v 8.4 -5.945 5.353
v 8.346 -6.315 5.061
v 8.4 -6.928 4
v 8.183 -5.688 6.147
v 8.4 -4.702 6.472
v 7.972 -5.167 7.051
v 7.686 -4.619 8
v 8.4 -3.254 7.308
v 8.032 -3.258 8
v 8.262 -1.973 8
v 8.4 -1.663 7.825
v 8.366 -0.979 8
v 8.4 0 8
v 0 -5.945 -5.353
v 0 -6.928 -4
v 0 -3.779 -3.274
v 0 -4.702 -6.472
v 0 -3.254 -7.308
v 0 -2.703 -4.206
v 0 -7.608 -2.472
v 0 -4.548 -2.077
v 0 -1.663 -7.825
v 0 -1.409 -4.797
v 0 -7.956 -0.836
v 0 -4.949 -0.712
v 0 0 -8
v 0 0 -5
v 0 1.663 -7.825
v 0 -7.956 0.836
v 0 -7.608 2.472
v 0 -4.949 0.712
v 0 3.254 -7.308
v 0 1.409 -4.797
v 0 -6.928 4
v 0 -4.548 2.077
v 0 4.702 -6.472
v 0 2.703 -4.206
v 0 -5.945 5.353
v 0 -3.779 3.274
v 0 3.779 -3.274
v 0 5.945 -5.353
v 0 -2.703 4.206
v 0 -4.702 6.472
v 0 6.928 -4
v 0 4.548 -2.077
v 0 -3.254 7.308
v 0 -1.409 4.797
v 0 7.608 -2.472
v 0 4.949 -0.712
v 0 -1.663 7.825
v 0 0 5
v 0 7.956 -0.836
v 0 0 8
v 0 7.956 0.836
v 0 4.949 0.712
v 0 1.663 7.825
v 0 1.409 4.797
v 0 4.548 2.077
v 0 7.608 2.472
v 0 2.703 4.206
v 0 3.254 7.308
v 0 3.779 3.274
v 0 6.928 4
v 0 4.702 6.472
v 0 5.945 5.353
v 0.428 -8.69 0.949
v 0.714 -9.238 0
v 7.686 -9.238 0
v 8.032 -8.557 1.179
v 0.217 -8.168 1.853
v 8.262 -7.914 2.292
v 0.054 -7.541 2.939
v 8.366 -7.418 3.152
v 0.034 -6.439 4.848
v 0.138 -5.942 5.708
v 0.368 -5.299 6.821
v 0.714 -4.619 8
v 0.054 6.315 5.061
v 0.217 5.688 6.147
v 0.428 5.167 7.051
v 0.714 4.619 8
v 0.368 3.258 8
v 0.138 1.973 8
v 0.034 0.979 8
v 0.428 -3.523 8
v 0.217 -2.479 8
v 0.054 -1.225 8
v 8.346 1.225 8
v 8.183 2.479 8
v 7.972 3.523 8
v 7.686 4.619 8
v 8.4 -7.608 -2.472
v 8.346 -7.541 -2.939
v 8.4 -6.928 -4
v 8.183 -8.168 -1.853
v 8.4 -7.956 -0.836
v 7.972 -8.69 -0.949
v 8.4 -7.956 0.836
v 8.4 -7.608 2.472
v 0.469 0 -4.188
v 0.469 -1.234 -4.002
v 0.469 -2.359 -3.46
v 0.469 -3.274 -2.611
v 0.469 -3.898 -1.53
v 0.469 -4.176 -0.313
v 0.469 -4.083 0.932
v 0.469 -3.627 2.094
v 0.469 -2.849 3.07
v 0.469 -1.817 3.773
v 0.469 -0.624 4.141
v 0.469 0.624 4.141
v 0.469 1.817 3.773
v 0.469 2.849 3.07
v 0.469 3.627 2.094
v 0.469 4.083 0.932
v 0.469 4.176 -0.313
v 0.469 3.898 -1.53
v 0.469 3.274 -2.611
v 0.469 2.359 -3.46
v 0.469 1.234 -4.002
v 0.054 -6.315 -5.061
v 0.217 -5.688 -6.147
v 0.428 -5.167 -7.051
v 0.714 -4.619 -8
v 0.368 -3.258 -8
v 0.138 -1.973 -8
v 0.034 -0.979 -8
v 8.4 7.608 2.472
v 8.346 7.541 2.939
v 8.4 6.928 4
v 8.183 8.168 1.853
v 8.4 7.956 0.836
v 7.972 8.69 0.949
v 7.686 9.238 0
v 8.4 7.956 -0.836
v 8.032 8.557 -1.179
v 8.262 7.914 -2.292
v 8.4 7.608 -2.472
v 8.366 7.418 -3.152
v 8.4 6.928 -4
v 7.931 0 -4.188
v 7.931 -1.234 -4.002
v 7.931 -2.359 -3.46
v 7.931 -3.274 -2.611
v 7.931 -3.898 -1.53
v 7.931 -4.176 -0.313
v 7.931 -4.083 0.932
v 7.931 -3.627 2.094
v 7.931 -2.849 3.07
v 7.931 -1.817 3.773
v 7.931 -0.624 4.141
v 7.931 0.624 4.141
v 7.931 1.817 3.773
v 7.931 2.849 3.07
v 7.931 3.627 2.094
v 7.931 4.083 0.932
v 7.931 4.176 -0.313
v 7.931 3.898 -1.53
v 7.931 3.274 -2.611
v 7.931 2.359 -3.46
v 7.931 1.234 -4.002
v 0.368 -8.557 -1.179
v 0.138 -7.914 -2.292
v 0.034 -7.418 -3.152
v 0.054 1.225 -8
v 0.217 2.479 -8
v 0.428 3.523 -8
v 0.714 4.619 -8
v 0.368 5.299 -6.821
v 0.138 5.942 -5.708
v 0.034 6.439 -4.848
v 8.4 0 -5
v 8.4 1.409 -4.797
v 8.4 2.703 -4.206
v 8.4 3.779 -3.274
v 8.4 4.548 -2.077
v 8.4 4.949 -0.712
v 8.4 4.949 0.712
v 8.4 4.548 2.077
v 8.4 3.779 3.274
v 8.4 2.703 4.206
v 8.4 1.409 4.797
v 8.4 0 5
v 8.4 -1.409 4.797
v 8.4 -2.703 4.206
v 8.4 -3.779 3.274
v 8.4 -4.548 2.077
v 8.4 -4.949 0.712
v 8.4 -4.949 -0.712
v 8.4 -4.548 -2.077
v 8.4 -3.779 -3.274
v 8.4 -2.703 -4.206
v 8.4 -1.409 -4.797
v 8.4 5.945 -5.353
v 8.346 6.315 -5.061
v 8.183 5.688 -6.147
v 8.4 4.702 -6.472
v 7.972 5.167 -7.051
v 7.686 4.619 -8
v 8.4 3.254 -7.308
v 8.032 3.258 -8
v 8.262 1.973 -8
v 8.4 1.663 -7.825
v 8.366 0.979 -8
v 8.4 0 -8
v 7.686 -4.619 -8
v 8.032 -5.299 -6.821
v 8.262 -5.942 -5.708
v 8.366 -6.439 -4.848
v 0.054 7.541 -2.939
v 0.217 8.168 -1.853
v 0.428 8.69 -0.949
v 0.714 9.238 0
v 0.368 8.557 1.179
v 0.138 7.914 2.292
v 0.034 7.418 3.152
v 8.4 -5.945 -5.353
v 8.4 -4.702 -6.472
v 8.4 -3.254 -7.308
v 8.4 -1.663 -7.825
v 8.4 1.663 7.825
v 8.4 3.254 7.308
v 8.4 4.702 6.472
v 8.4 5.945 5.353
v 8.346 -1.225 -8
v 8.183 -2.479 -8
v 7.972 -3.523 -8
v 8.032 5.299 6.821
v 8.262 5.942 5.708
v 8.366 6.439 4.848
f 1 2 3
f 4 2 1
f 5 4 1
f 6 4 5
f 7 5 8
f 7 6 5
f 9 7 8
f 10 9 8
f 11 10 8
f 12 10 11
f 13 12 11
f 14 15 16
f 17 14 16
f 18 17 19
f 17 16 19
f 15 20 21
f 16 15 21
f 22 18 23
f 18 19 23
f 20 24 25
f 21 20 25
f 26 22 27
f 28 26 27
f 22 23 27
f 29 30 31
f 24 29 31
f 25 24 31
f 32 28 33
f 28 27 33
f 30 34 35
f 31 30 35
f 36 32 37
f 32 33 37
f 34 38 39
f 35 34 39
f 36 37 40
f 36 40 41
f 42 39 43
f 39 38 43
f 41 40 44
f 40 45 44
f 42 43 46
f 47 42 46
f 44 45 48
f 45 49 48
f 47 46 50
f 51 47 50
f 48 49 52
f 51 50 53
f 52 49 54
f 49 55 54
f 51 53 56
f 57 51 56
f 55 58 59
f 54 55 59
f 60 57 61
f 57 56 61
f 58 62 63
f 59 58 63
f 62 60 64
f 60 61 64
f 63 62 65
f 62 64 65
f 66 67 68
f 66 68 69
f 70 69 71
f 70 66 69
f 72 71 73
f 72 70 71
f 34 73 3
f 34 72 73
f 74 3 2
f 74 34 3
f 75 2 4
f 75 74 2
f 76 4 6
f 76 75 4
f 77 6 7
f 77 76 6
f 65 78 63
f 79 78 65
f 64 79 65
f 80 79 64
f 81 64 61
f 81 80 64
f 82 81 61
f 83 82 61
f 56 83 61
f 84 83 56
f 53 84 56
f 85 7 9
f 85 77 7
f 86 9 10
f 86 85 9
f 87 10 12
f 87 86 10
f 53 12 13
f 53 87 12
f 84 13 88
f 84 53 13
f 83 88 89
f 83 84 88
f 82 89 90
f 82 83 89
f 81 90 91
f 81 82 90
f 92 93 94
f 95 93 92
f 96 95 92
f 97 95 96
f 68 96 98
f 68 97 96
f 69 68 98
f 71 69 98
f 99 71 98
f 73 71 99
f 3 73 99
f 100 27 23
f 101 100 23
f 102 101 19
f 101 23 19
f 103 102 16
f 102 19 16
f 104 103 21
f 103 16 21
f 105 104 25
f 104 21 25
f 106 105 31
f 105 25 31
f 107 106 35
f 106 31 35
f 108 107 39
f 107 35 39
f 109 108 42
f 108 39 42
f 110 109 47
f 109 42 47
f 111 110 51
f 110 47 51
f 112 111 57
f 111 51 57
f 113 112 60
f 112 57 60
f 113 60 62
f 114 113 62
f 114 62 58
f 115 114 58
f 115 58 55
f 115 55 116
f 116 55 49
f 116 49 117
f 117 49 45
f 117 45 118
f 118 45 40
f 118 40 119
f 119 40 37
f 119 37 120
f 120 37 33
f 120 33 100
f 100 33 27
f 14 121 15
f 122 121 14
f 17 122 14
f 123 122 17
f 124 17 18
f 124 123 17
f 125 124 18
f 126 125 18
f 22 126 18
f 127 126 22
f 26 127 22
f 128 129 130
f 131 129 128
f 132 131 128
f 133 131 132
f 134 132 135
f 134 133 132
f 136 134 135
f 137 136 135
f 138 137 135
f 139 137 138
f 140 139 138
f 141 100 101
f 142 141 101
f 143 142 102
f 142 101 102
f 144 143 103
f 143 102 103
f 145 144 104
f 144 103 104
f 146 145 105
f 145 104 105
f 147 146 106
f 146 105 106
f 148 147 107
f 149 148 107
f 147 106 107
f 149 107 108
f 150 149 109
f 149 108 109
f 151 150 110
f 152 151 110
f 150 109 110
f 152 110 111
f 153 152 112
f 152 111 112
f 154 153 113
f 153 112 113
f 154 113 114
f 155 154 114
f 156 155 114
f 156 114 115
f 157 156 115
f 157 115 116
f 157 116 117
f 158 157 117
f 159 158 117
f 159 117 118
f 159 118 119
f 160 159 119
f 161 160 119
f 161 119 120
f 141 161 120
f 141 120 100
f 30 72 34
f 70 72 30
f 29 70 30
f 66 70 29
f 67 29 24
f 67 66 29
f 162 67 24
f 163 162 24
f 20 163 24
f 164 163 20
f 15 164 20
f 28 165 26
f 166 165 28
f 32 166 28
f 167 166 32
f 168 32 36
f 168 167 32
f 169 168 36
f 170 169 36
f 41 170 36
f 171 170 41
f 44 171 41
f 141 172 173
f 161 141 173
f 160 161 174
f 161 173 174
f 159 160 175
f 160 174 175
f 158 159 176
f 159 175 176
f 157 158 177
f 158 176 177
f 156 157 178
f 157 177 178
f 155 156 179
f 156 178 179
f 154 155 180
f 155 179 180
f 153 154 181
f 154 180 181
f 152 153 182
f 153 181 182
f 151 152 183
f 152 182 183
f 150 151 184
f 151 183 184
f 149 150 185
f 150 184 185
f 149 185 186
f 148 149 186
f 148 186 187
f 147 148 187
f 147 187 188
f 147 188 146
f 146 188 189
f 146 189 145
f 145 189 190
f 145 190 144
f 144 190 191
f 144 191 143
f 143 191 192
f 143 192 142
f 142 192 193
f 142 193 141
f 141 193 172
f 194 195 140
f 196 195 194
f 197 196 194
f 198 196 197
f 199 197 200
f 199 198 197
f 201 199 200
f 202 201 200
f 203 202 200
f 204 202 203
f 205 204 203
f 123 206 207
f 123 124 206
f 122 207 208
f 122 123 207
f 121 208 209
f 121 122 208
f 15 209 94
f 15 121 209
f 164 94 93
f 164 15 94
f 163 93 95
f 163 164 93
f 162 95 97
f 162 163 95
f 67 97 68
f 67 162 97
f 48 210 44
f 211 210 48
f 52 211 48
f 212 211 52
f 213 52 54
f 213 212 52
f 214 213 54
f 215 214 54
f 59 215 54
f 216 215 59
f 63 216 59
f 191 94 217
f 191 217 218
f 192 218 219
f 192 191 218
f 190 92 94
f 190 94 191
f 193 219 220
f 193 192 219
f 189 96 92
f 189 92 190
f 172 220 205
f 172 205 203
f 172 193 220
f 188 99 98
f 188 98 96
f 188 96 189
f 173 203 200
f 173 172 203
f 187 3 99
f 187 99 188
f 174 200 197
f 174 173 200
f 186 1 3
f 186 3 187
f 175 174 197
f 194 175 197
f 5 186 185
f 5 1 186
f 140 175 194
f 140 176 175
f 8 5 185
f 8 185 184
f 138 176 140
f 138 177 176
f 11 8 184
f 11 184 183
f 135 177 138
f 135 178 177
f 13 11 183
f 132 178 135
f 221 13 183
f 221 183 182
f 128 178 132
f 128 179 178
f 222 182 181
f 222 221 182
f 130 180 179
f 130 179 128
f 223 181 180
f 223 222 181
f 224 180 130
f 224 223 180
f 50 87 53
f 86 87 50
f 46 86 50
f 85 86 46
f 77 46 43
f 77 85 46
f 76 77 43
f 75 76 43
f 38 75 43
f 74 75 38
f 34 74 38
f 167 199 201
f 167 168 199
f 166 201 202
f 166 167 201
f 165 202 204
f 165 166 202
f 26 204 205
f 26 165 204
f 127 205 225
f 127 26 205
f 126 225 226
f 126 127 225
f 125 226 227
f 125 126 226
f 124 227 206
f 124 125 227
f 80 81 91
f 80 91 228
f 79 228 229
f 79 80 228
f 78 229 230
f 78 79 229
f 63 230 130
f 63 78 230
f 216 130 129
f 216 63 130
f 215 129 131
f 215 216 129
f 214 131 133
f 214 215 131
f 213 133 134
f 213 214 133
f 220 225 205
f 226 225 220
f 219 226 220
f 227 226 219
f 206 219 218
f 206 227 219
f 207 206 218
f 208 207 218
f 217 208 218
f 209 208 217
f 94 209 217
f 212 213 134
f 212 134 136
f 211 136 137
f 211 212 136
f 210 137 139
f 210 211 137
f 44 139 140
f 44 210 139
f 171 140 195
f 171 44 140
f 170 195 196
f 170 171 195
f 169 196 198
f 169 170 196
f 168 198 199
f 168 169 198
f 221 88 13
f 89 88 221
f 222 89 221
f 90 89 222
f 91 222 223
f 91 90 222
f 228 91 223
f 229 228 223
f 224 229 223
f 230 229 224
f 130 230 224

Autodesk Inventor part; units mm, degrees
ref_plane "YZ Plane" through (0, 0, 0) normal (1, 0, 0) x (0, 1, 0)
ref_plane "XZ Plane" through (0, 0, 0) normal (0, 1, 0) x (-1, 0, 0)
sketch "Sketch1" plane through (0, 0, 0) normal (1, 0, 0) x (0, 1, 0)
  line L0 (-9.2376, 0) -> (-4.6188, 8)
  line L1 (-4.6188, 8) -> (4.6188, 8)
  line L2 (4.6188, 8) -> (9.2376, 0)
  line L3 (9.2376, 0) -> (4.6188, -8)
  line L4 (4.6188, -8) -> (-4.6188, -8)
  line L5 (-4.6188, -8) -> (-9.2376, 0)
  point P0 (0, 0)
  point P1 (0, 0)
  dimension "d0" = 18.4752
extrude "Body" add sketch "Sketch1" along normal blind 8.4
sketch "Sketch2" plane through (0, 0, 0) normal (0, 0, 1) x (1, 0, 0)
  line L0 (0, 4.6188) -> (0, 9.2376) projected
  line L1 (0, 9.2376) -> (8.4, 9.2376) projected
  line L2 (8.4, 4.6188) -> (8.4, 9.2376) projected
  line L3 (-1.68, 0) -> (10.08, 0) projected
  line L4 (0.7145, 9.2376) -> (0, 8)
  line L5 (7.6855, 9.2376) -> (8.4, 8)
  dimension "d3" = 30
  dimension "d4" = 30
  dimension "d5" = 16
  dimension "d6" = 16
revolve "Chamfer1" cut sketch "Sketch2" angle 360 about axis through (-10, 0, 0) along (1, 0, 0)
sketch "Sketch3" plane through (8.4, 0, 0) normal (1, 0, 0) x (0, 0, -1)
  arc A0 (-4, -6.9282) -> (4, -6.9282) centre (0, 0) ccw projected
hole "Thread" at (8.4, 0, 0) direction (-1, 0, 0) diameter 8.376 end through all thread size "M10x1.5" class "6H" standard "ISO Metric profile"
chamfer "Chamfer2" distance 0.8119 angle 30 1 edges at (8.4, 0, 4.188) measured on face at (8.4, -6.6899, -0.1683)
chamfer "Chamfer3" distance 0.8119 angle 30 1 edges at (0, 0, 4.188) measured on face at (0, -6.6899, -0.1683)
ref_plane "Work Plane1" through (-17.4436, 0, 0) normal (0, -0.866, -0.5) x (1, 0, 0)
equation "\"d0\" = 1.1547 * SW"
equation "\"d1\" = KOH"
equation "\"d8\" = -0.5 * GD1 + 0.5 * NND"
equation "\"d40\" = -0.5 * GD1 + 0.5 * NND"
equation "\"d10\" = -0.5 * GD1 + 0.5 * NND"
equation "\"d41\" = -0.5 * GD1 + 0.5 * NND"
equation "\"d3\" = ANG1"
equation "\"d4\" = ANG2"
equation "\"d5\" = SW0"
equation "\"d6\" = SW01"
equation "\"ANG1\" = 30deg"
equation "\"ANG2\" = 30deg"
equation "\"KOH\" = 8.4"
equation "\"SW\" = 16"
equation "\"SW0\" = SW"
equation "\"SW01\" = SW"
equation "\"GUL\" = 0.541266 * PTC"
equation "\"WFT\" = 0.6"
equation "\"TOA\" = 30deg"
equation "\"PTC\" = 1.5"
equation "\"E0\" = 1.155 * SW"
equation "\"GAL\" = 0.541266 * PTC"
equation "\"GD1\" = 8.376202"
equation "\"NND\" = 10"
properties part number "AS 1112 - M10  Type 5" material "Steel, Mild"
